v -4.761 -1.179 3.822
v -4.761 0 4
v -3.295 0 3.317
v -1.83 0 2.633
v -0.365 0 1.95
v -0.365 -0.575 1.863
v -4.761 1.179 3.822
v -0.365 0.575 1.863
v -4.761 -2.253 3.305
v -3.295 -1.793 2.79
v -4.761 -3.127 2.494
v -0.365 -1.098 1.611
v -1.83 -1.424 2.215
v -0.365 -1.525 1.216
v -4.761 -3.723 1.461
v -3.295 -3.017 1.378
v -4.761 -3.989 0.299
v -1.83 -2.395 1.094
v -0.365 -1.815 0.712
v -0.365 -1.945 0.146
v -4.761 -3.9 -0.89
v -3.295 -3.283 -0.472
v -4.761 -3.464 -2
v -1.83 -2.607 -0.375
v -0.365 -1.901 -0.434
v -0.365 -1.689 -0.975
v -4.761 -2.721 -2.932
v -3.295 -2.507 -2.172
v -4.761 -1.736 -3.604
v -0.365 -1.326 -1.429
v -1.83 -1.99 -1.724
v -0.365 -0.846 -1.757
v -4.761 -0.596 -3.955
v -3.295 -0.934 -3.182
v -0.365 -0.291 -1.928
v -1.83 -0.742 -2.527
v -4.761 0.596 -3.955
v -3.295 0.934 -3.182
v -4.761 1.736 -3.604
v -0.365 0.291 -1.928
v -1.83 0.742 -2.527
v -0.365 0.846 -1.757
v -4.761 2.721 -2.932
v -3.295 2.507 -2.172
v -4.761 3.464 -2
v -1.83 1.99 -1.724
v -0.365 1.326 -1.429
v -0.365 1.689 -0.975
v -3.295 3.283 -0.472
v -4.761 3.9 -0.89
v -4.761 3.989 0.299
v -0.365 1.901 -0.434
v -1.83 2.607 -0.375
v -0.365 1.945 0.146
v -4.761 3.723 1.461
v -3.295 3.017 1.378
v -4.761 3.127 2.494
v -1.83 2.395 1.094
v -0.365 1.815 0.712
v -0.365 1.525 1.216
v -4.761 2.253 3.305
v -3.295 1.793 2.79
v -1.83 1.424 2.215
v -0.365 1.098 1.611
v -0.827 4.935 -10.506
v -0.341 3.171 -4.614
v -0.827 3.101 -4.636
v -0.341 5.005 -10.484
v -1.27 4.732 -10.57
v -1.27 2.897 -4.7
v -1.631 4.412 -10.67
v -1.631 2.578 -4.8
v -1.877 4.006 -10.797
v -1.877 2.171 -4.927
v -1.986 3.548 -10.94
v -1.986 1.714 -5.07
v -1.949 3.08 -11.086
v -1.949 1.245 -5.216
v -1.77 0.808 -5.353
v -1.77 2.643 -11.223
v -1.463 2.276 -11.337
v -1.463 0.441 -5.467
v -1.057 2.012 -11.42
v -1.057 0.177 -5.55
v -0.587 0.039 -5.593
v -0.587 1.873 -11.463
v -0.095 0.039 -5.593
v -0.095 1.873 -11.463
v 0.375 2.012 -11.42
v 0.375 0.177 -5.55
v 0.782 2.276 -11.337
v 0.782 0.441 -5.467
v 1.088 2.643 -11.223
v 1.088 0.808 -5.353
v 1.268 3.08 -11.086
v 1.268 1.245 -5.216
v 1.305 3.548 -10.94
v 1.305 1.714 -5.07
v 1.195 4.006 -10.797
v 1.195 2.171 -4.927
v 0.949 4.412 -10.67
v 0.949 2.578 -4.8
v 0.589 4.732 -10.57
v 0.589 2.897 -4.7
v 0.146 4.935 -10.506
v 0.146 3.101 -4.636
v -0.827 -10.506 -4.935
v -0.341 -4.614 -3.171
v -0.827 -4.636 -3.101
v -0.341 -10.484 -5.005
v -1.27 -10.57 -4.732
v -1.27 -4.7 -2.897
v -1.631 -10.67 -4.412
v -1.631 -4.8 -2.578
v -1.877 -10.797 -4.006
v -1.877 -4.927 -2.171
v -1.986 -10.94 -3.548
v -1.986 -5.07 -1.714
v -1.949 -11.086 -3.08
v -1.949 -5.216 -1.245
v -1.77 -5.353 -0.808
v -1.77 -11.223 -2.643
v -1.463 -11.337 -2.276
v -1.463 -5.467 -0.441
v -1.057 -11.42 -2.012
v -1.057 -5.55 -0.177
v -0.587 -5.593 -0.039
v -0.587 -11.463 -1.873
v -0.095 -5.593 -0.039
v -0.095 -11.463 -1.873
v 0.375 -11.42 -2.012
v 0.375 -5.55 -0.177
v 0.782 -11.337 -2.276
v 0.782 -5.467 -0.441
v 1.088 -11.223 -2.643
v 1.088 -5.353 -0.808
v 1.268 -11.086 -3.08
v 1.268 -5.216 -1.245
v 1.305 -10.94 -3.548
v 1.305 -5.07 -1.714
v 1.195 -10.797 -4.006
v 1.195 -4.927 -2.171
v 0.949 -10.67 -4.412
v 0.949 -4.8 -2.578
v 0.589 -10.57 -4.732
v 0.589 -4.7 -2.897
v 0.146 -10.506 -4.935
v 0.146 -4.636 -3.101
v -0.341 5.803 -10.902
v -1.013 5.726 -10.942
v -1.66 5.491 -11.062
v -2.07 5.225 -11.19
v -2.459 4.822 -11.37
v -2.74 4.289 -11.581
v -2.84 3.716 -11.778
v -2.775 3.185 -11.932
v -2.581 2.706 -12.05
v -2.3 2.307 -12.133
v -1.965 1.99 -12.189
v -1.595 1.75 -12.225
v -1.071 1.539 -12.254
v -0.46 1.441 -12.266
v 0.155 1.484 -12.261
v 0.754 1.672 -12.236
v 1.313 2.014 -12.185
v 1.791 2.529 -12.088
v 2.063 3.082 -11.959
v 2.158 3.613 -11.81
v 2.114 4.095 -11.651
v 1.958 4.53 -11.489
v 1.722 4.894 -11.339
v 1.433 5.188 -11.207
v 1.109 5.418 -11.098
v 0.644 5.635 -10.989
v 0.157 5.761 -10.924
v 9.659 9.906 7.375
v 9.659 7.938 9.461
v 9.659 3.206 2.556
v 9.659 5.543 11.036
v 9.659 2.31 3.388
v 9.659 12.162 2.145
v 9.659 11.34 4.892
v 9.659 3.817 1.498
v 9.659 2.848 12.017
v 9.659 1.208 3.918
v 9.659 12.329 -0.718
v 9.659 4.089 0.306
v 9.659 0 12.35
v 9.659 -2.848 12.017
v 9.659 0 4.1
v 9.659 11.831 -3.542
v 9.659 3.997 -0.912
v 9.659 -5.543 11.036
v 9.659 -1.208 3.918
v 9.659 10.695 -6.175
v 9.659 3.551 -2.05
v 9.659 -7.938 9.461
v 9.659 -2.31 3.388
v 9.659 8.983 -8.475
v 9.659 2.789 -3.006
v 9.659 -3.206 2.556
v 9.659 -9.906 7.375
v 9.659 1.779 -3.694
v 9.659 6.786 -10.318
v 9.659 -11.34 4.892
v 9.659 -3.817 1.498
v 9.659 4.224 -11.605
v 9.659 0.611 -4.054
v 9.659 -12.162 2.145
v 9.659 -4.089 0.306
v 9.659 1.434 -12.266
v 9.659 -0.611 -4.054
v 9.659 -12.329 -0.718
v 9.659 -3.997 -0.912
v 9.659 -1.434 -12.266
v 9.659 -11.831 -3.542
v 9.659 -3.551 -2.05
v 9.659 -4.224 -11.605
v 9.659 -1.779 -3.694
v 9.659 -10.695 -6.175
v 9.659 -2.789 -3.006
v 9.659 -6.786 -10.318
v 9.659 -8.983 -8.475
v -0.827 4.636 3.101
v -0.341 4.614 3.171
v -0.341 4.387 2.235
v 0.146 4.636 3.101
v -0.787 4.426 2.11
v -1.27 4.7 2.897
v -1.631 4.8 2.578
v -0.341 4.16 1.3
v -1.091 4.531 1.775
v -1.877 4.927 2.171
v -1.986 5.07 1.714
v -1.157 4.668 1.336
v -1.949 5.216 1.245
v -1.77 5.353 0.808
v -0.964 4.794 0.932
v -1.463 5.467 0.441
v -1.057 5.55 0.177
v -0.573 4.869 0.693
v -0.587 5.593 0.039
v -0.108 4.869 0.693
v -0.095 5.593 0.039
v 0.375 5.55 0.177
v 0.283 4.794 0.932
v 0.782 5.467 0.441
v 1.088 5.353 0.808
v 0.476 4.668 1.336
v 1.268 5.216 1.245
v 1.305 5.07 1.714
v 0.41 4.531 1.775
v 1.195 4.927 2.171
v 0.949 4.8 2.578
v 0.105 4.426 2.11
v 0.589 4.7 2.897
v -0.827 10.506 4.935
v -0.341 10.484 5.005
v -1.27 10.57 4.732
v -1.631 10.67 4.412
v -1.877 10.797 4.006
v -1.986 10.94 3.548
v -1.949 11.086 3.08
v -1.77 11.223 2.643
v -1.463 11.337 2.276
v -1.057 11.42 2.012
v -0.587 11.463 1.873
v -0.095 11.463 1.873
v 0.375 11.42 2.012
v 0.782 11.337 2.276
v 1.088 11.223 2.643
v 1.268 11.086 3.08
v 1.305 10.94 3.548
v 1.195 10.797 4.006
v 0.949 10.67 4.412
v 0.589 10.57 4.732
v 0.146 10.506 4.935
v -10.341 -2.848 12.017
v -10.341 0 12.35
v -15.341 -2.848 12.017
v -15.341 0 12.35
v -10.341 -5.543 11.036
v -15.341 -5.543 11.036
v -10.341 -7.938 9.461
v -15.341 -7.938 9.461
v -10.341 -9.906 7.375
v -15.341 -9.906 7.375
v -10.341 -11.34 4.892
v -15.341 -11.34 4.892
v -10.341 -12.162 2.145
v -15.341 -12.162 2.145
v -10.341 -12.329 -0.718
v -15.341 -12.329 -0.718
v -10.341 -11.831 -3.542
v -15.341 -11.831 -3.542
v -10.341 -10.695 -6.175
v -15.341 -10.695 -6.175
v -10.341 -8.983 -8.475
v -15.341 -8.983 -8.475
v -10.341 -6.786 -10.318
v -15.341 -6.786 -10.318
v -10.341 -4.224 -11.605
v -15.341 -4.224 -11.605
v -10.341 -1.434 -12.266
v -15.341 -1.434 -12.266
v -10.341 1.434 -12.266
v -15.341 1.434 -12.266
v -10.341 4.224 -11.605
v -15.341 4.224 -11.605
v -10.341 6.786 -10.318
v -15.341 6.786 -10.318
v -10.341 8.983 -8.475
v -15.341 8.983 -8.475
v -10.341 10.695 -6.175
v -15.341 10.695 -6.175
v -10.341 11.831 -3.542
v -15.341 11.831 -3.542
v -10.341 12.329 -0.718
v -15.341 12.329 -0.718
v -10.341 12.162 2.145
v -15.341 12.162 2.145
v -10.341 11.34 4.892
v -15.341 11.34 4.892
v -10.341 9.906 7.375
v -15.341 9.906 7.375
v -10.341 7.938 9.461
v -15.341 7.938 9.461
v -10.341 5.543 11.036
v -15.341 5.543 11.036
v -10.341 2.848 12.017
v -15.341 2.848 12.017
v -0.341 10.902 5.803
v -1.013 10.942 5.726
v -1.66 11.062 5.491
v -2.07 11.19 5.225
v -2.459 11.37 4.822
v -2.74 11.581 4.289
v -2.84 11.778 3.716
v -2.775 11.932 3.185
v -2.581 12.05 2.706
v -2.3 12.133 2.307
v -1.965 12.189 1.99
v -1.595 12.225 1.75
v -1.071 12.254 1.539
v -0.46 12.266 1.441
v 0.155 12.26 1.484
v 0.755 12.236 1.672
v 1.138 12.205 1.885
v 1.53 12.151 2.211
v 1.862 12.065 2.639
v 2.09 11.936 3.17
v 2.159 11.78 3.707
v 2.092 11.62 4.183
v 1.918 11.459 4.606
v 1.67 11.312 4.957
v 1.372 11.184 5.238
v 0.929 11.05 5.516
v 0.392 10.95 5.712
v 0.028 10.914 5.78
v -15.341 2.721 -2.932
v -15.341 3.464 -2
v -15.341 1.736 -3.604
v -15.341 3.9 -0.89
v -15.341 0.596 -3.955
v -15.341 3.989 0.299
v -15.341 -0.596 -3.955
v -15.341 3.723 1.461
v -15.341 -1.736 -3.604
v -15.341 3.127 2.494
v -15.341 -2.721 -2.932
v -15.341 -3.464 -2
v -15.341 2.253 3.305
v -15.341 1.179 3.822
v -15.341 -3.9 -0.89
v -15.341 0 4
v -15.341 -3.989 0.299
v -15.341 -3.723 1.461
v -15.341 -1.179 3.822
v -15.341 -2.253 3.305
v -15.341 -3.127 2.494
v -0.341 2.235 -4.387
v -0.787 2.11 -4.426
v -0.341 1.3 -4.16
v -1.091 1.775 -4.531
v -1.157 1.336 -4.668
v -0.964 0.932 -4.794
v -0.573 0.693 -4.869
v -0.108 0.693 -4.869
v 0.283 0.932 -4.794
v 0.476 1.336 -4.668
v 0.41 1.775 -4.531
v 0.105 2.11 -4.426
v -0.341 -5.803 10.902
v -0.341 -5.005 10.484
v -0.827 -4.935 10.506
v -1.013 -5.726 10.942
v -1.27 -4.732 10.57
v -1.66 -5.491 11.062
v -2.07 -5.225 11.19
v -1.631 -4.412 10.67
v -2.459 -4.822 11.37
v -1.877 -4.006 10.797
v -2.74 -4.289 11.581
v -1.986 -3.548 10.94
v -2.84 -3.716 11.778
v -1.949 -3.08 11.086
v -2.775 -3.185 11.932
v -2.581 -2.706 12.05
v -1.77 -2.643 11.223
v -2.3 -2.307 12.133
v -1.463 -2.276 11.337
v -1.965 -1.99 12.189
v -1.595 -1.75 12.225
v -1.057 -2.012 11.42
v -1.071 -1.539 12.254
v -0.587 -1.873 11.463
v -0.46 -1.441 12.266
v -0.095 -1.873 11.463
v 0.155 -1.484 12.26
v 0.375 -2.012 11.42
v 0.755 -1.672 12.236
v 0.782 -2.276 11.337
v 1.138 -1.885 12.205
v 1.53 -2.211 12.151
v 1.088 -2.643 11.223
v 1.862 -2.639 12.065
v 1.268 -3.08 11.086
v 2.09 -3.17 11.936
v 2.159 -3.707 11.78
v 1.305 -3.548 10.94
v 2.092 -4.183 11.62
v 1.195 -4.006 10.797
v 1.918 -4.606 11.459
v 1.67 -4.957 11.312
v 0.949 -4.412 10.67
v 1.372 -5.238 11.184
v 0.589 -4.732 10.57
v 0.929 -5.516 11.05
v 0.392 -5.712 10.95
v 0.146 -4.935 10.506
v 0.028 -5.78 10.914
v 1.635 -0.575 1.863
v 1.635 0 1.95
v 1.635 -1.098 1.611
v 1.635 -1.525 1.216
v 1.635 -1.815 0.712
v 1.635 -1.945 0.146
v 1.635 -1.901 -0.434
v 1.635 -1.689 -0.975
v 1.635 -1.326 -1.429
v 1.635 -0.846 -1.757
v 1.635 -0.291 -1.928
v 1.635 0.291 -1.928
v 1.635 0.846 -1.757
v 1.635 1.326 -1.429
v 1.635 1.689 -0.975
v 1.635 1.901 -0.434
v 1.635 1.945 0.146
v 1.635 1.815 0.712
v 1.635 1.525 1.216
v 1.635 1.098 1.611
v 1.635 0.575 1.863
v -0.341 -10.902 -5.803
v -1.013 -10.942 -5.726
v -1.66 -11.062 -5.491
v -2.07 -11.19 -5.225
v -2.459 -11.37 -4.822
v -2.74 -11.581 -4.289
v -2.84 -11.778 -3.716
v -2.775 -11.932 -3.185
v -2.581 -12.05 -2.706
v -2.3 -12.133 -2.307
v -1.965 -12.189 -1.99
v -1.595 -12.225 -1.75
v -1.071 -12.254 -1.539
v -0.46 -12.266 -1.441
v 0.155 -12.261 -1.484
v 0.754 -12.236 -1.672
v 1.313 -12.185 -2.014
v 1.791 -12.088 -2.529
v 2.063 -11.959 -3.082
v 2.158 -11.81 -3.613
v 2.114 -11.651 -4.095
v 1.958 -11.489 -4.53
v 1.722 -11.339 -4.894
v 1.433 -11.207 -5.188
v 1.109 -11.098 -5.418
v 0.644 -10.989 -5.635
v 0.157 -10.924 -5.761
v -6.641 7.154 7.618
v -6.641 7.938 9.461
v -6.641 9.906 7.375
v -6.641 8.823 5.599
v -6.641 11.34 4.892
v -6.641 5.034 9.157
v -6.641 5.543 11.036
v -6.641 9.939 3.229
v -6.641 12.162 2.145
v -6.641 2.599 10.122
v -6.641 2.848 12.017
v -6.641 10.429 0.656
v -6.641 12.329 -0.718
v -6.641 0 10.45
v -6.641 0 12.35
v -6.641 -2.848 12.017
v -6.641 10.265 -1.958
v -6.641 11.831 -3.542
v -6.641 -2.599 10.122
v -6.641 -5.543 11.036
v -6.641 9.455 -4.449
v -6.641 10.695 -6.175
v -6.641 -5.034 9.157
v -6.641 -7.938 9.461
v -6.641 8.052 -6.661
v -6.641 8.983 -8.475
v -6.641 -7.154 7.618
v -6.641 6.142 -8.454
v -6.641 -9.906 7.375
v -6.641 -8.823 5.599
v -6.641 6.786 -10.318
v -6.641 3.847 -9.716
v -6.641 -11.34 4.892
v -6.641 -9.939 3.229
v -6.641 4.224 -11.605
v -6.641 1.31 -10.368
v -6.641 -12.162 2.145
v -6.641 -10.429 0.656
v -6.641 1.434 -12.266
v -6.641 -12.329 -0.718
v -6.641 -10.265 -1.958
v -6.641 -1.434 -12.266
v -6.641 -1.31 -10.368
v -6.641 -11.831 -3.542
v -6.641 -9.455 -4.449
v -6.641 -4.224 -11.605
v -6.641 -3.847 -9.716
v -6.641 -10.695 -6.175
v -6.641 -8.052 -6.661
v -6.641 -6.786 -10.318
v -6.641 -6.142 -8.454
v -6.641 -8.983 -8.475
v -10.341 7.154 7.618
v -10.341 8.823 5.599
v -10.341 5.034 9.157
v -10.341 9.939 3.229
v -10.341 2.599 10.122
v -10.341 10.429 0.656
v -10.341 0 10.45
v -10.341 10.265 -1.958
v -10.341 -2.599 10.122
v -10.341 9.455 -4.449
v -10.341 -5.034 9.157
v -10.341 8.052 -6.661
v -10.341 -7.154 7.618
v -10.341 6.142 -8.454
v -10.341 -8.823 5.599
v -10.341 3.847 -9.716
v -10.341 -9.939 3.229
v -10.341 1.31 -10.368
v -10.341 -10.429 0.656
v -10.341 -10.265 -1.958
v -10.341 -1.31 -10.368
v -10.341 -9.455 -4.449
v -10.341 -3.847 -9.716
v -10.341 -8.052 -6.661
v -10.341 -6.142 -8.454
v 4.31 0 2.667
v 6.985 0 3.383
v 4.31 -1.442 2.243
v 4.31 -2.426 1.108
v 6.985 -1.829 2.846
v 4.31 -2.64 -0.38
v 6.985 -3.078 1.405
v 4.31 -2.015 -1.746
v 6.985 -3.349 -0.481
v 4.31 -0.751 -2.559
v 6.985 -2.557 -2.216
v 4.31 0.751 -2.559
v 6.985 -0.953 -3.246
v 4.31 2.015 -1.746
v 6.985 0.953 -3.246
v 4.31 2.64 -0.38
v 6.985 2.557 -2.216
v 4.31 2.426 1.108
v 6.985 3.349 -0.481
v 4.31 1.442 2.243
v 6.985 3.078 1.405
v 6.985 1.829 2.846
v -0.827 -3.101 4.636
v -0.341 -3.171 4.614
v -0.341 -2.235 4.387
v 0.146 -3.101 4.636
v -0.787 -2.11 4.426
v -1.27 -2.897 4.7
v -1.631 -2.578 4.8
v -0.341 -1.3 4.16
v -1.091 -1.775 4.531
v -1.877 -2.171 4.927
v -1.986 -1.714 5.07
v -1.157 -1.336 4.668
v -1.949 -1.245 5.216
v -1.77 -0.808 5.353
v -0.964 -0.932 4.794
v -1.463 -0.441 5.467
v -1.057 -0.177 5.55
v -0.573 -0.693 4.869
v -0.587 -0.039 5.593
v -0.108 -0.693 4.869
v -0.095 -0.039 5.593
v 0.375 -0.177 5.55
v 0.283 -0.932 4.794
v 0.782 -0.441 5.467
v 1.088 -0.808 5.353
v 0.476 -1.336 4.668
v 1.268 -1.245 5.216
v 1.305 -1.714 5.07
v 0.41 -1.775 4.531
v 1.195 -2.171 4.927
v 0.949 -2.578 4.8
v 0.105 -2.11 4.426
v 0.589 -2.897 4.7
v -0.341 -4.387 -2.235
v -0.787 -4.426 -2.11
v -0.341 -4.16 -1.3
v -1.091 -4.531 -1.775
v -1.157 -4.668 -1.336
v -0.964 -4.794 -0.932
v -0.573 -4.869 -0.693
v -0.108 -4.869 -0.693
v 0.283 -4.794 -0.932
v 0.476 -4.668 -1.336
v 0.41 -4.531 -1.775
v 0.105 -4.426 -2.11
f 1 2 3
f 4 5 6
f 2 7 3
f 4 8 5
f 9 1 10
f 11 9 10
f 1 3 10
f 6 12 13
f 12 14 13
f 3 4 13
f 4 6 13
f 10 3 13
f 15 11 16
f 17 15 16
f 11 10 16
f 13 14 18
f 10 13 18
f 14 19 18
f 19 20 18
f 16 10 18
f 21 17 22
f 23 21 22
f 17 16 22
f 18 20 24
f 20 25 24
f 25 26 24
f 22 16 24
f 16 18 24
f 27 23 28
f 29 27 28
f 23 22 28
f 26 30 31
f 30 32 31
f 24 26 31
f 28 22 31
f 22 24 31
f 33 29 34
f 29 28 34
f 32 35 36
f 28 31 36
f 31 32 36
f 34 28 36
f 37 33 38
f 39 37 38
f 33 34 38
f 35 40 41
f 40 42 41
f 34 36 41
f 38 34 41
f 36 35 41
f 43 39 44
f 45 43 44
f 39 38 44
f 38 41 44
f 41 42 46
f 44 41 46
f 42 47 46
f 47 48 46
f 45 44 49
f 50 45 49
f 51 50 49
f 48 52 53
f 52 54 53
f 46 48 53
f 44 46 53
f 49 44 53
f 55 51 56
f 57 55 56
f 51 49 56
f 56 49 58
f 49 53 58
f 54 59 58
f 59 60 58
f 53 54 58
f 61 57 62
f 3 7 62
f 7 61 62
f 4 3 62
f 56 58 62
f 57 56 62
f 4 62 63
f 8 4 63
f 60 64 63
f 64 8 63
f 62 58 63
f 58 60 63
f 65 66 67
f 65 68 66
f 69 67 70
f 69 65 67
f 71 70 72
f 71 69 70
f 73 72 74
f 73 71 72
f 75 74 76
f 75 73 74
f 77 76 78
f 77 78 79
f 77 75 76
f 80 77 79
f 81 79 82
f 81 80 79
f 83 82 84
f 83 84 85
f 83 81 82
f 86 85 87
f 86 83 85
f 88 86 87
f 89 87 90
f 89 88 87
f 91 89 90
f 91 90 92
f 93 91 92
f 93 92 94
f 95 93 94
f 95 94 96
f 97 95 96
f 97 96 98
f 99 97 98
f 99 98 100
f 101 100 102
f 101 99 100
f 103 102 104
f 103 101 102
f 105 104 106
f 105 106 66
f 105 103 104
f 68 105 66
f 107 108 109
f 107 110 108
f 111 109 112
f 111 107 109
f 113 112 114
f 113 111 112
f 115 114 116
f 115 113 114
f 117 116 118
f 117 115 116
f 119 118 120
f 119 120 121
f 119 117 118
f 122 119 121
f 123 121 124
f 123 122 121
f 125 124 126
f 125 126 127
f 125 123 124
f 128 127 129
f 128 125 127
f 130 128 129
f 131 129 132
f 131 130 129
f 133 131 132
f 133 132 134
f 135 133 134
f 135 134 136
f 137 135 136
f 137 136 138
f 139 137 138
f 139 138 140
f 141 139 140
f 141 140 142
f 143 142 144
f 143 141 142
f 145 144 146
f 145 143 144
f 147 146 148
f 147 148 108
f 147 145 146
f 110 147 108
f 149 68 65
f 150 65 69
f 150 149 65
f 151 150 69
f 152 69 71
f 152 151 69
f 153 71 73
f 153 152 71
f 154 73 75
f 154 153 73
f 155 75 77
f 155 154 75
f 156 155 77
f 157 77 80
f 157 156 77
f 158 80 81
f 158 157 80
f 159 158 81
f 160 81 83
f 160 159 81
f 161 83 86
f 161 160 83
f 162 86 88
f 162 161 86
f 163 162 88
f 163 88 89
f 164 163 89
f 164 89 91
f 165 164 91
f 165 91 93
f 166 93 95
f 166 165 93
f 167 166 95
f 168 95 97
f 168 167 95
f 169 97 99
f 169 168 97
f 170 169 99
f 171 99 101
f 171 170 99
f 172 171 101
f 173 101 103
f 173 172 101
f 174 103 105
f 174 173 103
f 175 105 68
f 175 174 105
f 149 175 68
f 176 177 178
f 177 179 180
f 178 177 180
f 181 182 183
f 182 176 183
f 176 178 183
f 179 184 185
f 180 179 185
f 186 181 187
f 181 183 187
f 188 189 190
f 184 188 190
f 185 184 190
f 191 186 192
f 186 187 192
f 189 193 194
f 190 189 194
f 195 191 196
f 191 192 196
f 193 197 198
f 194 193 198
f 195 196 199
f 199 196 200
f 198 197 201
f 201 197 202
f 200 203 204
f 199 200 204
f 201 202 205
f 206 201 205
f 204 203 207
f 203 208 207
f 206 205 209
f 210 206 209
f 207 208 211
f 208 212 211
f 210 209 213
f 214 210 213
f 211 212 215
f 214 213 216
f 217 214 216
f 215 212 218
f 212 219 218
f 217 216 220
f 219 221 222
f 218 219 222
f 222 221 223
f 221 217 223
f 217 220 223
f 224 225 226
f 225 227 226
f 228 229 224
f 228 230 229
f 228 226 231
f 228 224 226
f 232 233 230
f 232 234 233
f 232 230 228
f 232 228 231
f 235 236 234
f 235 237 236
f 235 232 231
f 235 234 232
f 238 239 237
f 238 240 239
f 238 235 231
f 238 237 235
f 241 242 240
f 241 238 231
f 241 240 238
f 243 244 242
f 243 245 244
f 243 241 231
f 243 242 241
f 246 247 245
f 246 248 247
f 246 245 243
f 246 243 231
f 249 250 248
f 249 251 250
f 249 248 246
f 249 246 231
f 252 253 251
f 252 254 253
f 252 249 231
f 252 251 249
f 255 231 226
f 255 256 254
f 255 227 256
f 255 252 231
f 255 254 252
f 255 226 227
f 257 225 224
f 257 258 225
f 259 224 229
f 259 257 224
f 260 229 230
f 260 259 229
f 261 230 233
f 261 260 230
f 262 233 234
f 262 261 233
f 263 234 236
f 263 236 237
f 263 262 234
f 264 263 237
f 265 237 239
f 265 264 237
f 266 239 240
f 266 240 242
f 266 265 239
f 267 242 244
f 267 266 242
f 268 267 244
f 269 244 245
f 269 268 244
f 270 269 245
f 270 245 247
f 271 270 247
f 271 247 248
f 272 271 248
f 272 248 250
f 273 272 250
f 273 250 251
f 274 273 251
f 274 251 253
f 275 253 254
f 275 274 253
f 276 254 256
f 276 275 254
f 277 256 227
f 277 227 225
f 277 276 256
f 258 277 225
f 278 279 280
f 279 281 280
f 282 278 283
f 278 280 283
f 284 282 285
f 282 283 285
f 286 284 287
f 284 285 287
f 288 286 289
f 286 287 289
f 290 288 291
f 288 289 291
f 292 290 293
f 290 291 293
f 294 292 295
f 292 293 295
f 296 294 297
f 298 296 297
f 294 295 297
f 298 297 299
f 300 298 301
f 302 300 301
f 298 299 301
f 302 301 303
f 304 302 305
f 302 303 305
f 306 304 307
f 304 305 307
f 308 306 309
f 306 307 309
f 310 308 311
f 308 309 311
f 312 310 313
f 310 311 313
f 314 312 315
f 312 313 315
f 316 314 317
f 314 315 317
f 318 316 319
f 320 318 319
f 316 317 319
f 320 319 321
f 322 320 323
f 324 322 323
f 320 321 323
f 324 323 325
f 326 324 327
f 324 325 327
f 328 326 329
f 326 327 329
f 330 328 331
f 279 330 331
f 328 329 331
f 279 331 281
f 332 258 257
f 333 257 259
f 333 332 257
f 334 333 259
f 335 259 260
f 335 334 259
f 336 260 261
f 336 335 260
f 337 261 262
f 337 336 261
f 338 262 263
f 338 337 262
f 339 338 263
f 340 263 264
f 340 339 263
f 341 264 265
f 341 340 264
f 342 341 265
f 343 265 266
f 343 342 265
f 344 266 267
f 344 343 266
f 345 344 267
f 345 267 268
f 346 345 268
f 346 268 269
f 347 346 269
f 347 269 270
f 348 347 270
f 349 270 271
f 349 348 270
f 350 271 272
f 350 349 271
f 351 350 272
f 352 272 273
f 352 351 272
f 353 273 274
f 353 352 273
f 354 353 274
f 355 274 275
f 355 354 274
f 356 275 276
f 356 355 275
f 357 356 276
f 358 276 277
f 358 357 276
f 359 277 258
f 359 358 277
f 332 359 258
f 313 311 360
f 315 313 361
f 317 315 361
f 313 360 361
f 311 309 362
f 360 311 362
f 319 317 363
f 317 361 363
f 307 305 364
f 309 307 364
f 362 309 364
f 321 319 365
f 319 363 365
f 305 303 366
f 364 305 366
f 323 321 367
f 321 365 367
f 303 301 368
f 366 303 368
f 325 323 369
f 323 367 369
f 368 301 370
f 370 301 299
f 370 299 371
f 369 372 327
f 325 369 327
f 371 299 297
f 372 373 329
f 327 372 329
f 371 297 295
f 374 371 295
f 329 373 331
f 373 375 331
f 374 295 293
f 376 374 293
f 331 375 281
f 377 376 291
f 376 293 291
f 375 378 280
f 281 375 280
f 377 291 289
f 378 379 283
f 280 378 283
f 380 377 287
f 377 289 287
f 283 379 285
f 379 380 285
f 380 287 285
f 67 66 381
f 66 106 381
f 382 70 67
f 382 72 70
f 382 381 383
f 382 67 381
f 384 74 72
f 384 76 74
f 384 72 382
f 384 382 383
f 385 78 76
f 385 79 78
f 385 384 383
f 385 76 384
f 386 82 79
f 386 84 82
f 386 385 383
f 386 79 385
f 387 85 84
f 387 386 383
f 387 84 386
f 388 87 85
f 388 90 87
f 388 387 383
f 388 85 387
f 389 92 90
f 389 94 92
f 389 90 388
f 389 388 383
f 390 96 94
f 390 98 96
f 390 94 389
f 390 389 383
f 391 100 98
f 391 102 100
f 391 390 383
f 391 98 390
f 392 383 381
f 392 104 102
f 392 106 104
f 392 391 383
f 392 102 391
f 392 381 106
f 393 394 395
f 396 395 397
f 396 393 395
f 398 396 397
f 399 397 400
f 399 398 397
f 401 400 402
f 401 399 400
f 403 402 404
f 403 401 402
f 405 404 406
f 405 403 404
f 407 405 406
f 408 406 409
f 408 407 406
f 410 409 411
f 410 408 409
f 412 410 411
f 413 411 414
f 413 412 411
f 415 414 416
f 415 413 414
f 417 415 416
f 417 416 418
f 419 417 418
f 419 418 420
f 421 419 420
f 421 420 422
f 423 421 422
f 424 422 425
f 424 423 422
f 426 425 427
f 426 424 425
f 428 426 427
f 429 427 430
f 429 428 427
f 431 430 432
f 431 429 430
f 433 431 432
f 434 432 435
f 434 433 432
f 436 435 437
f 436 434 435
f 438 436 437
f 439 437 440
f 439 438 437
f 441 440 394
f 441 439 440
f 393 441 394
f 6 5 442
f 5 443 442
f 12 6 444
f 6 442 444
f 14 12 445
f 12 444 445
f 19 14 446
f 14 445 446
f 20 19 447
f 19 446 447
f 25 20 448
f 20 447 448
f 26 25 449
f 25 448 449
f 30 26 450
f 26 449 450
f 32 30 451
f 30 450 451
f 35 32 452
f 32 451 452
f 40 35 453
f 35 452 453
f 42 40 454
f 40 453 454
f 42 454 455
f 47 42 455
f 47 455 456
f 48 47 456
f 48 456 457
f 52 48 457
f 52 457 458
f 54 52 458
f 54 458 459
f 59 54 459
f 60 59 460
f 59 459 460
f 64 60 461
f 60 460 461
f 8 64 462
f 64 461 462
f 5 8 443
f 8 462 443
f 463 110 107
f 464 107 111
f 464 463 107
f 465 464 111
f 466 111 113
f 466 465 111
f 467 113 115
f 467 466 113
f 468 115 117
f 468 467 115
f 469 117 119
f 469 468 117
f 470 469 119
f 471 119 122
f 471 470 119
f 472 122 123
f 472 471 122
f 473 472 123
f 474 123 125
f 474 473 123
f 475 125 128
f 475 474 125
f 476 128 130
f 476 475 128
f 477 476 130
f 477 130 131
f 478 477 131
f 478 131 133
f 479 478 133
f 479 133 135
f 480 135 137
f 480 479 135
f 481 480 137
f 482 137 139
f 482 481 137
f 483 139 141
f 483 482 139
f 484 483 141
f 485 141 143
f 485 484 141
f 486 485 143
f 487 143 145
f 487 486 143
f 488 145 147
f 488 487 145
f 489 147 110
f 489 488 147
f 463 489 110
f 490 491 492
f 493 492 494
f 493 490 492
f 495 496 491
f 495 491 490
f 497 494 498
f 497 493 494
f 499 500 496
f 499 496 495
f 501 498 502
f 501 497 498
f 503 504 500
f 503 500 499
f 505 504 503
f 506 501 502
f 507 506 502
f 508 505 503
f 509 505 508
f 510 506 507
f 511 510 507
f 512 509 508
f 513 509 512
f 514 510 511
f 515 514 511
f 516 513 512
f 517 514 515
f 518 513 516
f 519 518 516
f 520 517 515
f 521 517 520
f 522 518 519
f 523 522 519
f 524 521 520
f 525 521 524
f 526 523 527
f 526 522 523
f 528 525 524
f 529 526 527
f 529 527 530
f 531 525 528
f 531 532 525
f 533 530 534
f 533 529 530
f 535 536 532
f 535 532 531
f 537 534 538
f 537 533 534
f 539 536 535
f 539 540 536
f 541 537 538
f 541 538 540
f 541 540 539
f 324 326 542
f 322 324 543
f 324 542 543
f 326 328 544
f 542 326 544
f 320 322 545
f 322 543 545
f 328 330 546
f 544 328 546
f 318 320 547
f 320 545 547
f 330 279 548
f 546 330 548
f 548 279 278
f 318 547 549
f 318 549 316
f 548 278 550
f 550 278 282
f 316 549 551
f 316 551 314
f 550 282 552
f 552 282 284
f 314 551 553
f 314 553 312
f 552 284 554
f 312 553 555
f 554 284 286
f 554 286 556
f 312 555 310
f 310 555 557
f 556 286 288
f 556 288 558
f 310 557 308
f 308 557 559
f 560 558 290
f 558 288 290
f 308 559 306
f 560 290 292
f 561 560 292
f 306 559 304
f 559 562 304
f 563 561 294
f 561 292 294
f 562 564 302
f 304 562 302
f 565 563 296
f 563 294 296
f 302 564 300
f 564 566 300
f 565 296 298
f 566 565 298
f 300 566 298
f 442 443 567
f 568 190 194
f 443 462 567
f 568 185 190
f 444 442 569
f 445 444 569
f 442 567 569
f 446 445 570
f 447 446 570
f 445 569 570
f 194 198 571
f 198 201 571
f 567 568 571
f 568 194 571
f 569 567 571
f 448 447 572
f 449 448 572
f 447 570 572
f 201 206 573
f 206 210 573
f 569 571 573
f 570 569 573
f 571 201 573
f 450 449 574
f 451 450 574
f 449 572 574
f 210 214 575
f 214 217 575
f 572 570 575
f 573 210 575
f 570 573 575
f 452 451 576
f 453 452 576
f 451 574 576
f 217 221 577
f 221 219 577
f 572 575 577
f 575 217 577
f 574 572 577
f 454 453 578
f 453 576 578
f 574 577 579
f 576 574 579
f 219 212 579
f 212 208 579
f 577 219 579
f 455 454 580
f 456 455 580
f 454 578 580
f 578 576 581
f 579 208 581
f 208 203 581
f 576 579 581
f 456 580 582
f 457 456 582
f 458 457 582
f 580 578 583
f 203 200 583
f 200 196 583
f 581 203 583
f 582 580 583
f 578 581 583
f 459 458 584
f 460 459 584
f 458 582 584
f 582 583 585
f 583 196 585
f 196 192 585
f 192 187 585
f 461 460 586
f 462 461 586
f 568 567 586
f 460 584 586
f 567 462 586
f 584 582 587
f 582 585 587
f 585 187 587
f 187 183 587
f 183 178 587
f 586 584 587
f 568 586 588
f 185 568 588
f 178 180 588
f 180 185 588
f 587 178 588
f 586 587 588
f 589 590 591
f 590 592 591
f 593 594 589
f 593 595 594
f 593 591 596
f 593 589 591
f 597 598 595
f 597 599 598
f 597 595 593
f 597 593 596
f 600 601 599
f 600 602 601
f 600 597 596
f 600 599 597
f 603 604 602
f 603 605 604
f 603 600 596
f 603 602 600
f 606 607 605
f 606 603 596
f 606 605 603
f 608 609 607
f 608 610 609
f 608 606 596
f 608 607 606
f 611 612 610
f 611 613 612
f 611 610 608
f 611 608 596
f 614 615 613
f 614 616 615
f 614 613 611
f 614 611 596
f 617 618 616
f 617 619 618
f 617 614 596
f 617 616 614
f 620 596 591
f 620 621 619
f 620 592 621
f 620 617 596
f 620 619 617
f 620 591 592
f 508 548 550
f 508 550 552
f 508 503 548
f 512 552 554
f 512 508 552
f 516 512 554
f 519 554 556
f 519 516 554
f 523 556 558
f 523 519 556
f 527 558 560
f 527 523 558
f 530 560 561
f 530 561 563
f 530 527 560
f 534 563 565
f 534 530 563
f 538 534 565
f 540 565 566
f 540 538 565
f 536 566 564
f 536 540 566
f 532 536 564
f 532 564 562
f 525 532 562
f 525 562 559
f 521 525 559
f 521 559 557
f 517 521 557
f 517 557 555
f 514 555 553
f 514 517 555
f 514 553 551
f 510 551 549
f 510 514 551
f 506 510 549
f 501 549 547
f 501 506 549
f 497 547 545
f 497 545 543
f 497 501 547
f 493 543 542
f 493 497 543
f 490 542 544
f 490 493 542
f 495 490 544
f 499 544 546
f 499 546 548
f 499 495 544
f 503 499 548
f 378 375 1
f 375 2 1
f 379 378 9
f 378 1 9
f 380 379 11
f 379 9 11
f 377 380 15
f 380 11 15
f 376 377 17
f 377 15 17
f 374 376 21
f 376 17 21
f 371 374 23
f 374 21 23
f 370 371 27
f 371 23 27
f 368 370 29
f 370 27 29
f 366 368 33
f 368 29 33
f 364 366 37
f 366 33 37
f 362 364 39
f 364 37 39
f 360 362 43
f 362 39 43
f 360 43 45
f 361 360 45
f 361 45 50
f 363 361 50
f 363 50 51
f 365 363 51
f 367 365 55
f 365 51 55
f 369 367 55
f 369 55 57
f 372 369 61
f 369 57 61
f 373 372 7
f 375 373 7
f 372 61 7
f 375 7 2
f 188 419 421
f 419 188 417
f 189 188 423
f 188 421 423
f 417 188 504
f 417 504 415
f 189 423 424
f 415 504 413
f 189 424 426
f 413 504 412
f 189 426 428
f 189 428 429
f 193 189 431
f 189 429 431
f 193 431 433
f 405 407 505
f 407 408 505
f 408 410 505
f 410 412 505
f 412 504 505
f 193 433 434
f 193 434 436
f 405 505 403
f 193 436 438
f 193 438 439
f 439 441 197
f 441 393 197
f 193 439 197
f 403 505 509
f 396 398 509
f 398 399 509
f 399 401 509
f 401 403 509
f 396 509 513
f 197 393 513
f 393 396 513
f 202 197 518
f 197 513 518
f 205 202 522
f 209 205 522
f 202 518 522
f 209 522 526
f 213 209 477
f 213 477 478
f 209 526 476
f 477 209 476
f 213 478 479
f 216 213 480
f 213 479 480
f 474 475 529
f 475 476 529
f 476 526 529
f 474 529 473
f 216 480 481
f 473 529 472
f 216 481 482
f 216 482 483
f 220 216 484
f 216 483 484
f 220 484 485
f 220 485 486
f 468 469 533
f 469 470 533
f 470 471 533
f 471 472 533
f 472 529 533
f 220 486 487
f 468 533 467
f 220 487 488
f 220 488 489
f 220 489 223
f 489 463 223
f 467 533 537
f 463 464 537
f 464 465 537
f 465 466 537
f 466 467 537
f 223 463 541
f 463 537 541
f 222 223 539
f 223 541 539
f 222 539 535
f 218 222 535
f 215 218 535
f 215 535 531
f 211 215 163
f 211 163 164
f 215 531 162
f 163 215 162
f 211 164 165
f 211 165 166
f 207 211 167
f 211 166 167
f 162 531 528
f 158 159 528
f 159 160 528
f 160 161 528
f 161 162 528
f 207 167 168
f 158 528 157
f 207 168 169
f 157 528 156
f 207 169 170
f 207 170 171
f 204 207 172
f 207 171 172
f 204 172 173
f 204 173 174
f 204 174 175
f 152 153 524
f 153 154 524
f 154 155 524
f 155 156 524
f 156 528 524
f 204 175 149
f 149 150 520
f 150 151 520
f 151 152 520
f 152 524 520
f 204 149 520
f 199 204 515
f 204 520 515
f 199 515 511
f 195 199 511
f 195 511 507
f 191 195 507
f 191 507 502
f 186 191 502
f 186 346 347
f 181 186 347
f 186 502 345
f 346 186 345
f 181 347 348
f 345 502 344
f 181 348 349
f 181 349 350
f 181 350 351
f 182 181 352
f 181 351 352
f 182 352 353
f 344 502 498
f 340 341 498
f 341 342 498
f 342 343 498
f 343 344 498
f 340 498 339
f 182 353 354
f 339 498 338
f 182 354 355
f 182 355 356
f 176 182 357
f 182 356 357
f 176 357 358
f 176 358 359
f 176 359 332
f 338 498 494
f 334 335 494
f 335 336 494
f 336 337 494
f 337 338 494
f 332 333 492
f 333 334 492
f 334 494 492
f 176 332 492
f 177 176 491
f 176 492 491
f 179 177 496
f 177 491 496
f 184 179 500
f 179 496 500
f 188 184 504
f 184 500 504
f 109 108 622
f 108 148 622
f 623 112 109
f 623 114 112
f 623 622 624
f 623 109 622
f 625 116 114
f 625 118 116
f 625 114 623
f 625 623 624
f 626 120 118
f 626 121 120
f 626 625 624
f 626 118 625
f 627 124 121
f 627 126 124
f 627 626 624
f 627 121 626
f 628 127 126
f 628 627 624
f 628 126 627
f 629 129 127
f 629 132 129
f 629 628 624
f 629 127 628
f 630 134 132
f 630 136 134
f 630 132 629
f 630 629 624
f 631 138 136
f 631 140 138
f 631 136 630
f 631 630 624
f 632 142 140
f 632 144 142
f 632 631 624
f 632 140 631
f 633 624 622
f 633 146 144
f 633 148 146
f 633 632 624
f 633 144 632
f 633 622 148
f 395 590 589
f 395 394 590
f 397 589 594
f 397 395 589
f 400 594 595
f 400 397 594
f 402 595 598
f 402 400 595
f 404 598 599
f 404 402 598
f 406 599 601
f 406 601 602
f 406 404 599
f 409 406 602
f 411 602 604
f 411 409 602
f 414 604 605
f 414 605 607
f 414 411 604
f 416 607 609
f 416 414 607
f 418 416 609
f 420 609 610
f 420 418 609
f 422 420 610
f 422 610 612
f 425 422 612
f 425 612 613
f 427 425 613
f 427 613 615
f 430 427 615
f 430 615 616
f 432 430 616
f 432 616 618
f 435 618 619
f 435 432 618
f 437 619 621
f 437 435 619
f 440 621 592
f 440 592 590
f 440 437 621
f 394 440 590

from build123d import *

# Parameters (mm, degrees)
CIRPATTERN1_COUNT = 4
SKETCH4_W         = 3.7
SKETCH4_H         = 1.9


with BuildPart() as part:
    # Sketch2 → Revolve2 (revolve)
    with BuildSketch(Plane(origin=(0, 0, 0), x_dir=(1, 0, 0), z_dir=(0, 1, 0)), mode=Mode.PRIVATE) as revolve2_sk:
        Polygon((-15.340606893, 4), (-4.760755316, 4), (-0.364516129, 1.95), (1.635483871, 1.95), (9.659393107, 4.1), (9.659393107, 12.35), (-15.340606893, 12.35), align=None)
    revolve(revolve2_sk.sketch.rotate(Axis((-6.793548387, 0, 0), (1, 0, 0)), 180), axis=Axis((-6.793548387, 0, 0), (1, 0, 0)))

    # Sketch3 → M4x0.7 Tapped Hole1 (revolve, cut)
    with BuildSketch(Plane(origin=(-0.340606893, 11.787719099, 3.684043761), x_dir=(0, -0.2983031385746438, 0.9544711821299358), z_dir=(1, 0, 0))):
        Polygon((0, 0), (0, 7.991420021), (1.65, 7), (1.65, 0.85), (2.5, 0), align=None)
    m4x0_7_tapped_hole1 = revolve(axis=Axis((-0.340606893, 17.848611106, 5.578268691), (0, -0.9544711821299356, -0.2983031385746438)), mode=Mode.SUBTRACT)

    # CirPattern1: M4x0.7 Tapped Hole1 ×4 about axis
    cirpattern1_axis = Axis((-6.793548387, 0, 0), (-1, 0, 0))
    for i in range(1, CIRPATTERN1_COUNT):
        add(m4x0_7_tapped_hole1.rotate(cirpattern1_axis, i * 360 / CIRPATTERN1_COUNT), mode=Mode.SUBTRACT)

    # Sketch4 → Cut-Revolve1 (revolve, cut)
    with BuildSketch(Plane(origin=(0, 0, 0), x_dir=(1, 0, 0), z_dir=(0, 1, 0)), mode=Mode.PRIVATE) as cut_revolve1_sk:
        with Locations((-8.490606893, 11.4)):
            Rectangle(SKETCH4_W, SKETCH4_H)
    revolve(cut_revolve1_sk.sketch.rotate(Axis((-15.340606893, 0, 0), (1, 0, 0)), 180), axis=Axis((-15.340606893, 0, 0), (1, 0, 0)), mode=Mode.SUBTRACT)


solid = part.part
